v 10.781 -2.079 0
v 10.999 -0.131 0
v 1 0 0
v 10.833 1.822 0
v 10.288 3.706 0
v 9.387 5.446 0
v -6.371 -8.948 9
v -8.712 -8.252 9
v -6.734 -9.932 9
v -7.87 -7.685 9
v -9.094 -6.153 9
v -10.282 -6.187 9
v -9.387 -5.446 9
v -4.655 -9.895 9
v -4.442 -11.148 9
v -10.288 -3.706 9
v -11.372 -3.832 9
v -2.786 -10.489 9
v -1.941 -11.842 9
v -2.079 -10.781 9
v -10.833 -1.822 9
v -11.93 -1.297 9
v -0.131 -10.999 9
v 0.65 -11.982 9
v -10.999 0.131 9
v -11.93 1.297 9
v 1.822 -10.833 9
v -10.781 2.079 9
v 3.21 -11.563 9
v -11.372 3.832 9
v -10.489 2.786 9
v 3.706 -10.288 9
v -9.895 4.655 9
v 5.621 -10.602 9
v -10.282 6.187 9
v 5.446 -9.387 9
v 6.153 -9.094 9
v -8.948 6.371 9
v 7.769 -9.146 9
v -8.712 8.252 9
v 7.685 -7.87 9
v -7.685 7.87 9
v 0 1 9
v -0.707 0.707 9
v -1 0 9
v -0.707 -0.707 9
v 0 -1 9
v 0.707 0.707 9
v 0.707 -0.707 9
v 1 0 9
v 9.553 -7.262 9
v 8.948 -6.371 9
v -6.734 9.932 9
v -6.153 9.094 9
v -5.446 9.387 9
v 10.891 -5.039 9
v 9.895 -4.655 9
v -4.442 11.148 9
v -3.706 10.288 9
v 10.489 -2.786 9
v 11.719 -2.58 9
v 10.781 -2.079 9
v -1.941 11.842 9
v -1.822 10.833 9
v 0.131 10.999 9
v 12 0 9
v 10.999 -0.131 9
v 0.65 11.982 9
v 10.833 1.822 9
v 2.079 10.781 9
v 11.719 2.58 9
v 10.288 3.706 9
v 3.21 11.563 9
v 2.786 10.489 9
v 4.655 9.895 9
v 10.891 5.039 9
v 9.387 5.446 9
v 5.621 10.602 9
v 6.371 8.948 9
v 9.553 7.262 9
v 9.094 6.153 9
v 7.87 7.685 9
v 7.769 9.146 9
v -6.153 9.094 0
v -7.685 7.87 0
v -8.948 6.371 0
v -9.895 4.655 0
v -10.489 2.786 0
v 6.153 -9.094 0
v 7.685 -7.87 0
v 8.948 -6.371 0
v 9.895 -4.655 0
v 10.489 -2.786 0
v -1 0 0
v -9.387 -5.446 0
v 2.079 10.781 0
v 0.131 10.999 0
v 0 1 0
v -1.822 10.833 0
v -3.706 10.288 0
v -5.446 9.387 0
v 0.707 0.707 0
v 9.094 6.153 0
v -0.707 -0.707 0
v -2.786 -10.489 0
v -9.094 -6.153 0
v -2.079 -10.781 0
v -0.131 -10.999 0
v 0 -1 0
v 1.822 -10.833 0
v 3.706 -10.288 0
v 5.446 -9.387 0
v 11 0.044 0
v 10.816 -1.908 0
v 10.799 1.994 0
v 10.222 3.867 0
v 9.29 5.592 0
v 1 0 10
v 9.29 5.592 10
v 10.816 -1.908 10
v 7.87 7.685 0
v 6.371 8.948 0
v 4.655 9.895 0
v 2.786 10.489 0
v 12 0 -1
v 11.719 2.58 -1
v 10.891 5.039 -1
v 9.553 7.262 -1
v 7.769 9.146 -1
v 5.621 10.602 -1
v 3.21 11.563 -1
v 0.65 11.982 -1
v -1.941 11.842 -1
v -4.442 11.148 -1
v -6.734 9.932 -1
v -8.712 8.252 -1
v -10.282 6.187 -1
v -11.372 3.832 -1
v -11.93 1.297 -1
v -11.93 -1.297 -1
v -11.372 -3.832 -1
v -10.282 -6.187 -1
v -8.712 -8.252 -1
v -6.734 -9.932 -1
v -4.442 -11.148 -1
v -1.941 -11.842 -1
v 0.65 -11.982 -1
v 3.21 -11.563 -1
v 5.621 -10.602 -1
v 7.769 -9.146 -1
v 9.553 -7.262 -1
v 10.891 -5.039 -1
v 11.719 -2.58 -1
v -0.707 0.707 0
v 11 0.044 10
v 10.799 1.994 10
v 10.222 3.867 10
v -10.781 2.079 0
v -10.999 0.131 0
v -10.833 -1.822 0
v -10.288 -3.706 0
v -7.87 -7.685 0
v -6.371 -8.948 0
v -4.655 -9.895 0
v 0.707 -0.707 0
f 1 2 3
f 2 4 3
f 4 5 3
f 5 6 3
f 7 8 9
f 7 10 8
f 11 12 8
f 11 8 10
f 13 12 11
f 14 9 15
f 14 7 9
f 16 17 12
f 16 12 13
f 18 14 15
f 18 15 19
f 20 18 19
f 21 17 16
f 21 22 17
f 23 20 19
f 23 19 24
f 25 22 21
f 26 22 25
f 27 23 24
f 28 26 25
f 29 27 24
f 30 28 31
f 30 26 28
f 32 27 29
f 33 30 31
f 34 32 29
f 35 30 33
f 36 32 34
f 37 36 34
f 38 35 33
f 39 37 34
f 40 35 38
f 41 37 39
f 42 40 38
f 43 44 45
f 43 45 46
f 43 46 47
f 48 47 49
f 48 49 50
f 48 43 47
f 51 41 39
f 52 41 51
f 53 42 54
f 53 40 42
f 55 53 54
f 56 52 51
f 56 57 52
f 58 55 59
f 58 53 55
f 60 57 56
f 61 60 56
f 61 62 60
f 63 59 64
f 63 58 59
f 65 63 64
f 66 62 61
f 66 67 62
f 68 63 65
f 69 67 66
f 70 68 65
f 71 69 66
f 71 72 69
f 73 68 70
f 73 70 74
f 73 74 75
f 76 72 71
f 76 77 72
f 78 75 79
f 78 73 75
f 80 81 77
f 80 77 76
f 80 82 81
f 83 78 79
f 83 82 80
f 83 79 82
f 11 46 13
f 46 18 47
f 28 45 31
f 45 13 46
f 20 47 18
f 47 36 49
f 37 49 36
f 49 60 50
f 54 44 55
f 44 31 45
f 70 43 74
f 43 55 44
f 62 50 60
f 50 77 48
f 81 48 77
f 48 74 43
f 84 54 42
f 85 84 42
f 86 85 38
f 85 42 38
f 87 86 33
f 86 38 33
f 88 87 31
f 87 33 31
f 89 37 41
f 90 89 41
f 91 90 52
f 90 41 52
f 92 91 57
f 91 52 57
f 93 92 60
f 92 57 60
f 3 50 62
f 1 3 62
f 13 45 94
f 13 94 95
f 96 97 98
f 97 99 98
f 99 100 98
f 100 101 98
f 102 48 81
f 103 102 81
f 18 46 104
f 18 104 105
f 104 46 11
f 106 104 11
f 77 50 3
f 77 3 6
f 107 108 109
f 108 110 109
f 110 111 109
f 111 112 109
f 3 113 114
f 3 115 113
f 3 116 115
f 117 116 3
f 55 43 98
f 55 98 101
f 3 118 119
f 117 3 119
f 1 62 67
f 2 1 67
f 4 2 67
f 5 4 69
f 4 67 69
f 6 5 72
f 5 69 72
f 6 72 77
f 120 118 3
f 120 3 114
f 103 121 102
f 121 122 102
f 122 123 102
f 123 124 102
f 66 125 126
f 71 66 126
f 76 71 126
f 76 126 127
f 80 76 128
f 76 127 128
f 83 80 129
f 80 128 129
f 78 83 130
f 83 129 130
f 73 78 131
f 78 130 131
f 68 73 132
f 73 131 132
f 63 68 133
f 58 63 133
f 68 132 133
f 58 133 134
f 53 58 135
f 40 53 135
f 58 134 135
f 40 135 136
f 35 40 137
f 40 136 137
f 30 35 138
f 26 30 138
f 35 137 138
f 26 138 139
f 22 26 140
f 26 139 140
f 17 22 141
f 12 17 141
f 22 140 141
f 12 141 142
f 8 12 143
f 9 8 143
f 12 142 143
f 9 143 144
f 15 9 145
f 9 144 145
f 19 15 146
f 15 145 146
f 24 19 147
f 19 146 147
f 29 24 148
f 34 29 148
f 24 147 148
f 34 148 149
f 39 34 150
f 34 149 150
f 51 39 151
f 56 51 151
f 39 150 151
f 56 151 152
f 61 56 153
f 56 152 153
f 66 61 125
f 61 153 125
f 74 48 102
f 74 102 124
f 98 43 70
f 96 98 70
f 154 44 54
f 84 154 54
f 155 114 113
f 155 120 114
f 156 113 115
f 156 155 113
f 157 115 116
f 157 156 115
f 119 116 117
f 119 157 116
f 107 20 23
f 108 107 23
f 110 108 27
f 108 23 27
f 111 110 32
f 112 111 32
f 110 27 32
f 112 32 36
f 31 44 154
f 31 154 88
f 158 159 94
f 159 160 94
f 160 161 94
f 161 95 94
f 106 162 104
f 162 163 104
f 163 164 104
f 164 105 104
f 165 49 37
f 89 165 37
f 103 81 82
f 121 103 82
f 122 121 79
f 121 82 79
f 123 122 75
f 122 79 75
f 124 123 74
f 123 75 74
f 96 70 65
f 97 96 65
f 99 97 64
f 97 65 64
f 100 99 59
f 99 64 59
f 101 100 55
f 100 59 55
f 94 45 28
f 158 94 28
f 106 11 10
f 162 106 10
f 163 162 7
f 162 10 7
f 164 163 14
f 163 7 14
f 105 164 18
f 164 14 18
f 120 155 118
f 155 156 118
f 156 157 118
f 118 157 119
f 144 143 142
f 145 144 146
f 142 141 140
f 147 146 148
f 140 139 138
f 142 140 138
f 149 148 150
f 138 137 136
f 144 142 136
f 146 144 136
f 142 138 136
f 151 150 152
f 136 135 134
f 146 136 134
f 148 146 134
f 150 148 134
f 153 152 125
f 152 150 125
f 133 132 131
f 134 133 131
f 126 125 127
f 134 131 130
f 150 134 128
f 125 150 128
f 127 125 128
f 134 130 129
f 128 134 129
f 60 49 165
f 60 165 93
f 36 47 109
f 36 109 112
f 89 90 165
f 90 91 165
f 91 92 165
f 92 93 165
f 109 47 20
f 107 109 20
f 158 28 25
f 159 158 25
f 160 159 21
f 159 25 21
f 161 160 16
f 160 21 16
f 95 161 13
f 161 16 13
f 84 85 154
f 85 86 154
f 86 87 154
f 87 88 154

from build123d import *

# Parameters (mm, degrees)
CYLINDER001_W               = 10
CYLINDER001_H               = 10
CYLINDER001_ANGLE           = 45
CYLINDER001_PLACEMENT_ANGLE = 348
ARRAY_COUNT                 = 8
CYLINDER_R                  = 12
CYLINDER_DEPTH              = 10
CYLINDER002_W               = 10
CYLINDER002_H               = 10
CYLINDER002_ANGLE           = 45
CYLINDER002_PLACEMENT_ANGLE = 11


with BuildPart() as triangles_petits:
    # Cylinder001 → Cylinder001 (revolve)
    with BuildSketch(Plane.XZ):
        with Locations((5, 5)):
            Rectangle(CYLINDER001_W, CYLINDER001_H)
    revolve(axis=Axis((0, 0, 0), (0, 0, 1)), revolution_arc=CYLINDER001_ANGLE)


with BuildPart() as triangles_petits_1:
    # Cylinder001 placement: moved
    add(triangles_petits.part.moved(Location((1, 0, 0))).rotate(Axis((1, 0, 0), (0, 0, 1)), CYLINDER001_PLACEMENT_ANGLE))

    # Array: Triangles petits ×8 about axis
    array_axis = Axis((0, 0, 0), (0, 0, 1))


with BuildPart() as triangles_petits_2:
    add(triangles_petits_1.part)
    for i in range(1, ARRAY_COUNT):
        add(triangles_petits_1.part.rotate(array_axis, i * 360 / ARRAY_COUNT))


with BuildPart() as base:
    # Cylinder → Cylinder (new body)
    with BuildSketch(Plane.XY.offset(-1)):
        Circle(CYLINDER_R)
    extrude(amount=CYLINDER_DEPTH)

    # Cut: cut Triangles petits
    add(triangles_petits_2.part, mode=Mode.SUBTRACT)


with BuildPart() as cilindre:
    # Cylinder002 → Cylinder002 (revolve)
    with BuildSketch(Plane.XZ):
        with Locations((5, 5)):
            Rectangle(CYLINDER002_W, CYLINDER002_H)
    revolve(axis=Axis((0, 0, 0), (0, 0, 1)), revolution_arc=CYLINDER002_ANGLE)


with BuildPart() as cilindre_1:
    # Cylinder002 placement: moved
    add(cilindre.part.moved(Location((1, 0, 0))).rotate(Axis((1, 0, 0), (0, 0, -1)), CYLINDER002_PLACEMENT_ANGLE))


solid = Compound([base.part, cilindre_1.part])
